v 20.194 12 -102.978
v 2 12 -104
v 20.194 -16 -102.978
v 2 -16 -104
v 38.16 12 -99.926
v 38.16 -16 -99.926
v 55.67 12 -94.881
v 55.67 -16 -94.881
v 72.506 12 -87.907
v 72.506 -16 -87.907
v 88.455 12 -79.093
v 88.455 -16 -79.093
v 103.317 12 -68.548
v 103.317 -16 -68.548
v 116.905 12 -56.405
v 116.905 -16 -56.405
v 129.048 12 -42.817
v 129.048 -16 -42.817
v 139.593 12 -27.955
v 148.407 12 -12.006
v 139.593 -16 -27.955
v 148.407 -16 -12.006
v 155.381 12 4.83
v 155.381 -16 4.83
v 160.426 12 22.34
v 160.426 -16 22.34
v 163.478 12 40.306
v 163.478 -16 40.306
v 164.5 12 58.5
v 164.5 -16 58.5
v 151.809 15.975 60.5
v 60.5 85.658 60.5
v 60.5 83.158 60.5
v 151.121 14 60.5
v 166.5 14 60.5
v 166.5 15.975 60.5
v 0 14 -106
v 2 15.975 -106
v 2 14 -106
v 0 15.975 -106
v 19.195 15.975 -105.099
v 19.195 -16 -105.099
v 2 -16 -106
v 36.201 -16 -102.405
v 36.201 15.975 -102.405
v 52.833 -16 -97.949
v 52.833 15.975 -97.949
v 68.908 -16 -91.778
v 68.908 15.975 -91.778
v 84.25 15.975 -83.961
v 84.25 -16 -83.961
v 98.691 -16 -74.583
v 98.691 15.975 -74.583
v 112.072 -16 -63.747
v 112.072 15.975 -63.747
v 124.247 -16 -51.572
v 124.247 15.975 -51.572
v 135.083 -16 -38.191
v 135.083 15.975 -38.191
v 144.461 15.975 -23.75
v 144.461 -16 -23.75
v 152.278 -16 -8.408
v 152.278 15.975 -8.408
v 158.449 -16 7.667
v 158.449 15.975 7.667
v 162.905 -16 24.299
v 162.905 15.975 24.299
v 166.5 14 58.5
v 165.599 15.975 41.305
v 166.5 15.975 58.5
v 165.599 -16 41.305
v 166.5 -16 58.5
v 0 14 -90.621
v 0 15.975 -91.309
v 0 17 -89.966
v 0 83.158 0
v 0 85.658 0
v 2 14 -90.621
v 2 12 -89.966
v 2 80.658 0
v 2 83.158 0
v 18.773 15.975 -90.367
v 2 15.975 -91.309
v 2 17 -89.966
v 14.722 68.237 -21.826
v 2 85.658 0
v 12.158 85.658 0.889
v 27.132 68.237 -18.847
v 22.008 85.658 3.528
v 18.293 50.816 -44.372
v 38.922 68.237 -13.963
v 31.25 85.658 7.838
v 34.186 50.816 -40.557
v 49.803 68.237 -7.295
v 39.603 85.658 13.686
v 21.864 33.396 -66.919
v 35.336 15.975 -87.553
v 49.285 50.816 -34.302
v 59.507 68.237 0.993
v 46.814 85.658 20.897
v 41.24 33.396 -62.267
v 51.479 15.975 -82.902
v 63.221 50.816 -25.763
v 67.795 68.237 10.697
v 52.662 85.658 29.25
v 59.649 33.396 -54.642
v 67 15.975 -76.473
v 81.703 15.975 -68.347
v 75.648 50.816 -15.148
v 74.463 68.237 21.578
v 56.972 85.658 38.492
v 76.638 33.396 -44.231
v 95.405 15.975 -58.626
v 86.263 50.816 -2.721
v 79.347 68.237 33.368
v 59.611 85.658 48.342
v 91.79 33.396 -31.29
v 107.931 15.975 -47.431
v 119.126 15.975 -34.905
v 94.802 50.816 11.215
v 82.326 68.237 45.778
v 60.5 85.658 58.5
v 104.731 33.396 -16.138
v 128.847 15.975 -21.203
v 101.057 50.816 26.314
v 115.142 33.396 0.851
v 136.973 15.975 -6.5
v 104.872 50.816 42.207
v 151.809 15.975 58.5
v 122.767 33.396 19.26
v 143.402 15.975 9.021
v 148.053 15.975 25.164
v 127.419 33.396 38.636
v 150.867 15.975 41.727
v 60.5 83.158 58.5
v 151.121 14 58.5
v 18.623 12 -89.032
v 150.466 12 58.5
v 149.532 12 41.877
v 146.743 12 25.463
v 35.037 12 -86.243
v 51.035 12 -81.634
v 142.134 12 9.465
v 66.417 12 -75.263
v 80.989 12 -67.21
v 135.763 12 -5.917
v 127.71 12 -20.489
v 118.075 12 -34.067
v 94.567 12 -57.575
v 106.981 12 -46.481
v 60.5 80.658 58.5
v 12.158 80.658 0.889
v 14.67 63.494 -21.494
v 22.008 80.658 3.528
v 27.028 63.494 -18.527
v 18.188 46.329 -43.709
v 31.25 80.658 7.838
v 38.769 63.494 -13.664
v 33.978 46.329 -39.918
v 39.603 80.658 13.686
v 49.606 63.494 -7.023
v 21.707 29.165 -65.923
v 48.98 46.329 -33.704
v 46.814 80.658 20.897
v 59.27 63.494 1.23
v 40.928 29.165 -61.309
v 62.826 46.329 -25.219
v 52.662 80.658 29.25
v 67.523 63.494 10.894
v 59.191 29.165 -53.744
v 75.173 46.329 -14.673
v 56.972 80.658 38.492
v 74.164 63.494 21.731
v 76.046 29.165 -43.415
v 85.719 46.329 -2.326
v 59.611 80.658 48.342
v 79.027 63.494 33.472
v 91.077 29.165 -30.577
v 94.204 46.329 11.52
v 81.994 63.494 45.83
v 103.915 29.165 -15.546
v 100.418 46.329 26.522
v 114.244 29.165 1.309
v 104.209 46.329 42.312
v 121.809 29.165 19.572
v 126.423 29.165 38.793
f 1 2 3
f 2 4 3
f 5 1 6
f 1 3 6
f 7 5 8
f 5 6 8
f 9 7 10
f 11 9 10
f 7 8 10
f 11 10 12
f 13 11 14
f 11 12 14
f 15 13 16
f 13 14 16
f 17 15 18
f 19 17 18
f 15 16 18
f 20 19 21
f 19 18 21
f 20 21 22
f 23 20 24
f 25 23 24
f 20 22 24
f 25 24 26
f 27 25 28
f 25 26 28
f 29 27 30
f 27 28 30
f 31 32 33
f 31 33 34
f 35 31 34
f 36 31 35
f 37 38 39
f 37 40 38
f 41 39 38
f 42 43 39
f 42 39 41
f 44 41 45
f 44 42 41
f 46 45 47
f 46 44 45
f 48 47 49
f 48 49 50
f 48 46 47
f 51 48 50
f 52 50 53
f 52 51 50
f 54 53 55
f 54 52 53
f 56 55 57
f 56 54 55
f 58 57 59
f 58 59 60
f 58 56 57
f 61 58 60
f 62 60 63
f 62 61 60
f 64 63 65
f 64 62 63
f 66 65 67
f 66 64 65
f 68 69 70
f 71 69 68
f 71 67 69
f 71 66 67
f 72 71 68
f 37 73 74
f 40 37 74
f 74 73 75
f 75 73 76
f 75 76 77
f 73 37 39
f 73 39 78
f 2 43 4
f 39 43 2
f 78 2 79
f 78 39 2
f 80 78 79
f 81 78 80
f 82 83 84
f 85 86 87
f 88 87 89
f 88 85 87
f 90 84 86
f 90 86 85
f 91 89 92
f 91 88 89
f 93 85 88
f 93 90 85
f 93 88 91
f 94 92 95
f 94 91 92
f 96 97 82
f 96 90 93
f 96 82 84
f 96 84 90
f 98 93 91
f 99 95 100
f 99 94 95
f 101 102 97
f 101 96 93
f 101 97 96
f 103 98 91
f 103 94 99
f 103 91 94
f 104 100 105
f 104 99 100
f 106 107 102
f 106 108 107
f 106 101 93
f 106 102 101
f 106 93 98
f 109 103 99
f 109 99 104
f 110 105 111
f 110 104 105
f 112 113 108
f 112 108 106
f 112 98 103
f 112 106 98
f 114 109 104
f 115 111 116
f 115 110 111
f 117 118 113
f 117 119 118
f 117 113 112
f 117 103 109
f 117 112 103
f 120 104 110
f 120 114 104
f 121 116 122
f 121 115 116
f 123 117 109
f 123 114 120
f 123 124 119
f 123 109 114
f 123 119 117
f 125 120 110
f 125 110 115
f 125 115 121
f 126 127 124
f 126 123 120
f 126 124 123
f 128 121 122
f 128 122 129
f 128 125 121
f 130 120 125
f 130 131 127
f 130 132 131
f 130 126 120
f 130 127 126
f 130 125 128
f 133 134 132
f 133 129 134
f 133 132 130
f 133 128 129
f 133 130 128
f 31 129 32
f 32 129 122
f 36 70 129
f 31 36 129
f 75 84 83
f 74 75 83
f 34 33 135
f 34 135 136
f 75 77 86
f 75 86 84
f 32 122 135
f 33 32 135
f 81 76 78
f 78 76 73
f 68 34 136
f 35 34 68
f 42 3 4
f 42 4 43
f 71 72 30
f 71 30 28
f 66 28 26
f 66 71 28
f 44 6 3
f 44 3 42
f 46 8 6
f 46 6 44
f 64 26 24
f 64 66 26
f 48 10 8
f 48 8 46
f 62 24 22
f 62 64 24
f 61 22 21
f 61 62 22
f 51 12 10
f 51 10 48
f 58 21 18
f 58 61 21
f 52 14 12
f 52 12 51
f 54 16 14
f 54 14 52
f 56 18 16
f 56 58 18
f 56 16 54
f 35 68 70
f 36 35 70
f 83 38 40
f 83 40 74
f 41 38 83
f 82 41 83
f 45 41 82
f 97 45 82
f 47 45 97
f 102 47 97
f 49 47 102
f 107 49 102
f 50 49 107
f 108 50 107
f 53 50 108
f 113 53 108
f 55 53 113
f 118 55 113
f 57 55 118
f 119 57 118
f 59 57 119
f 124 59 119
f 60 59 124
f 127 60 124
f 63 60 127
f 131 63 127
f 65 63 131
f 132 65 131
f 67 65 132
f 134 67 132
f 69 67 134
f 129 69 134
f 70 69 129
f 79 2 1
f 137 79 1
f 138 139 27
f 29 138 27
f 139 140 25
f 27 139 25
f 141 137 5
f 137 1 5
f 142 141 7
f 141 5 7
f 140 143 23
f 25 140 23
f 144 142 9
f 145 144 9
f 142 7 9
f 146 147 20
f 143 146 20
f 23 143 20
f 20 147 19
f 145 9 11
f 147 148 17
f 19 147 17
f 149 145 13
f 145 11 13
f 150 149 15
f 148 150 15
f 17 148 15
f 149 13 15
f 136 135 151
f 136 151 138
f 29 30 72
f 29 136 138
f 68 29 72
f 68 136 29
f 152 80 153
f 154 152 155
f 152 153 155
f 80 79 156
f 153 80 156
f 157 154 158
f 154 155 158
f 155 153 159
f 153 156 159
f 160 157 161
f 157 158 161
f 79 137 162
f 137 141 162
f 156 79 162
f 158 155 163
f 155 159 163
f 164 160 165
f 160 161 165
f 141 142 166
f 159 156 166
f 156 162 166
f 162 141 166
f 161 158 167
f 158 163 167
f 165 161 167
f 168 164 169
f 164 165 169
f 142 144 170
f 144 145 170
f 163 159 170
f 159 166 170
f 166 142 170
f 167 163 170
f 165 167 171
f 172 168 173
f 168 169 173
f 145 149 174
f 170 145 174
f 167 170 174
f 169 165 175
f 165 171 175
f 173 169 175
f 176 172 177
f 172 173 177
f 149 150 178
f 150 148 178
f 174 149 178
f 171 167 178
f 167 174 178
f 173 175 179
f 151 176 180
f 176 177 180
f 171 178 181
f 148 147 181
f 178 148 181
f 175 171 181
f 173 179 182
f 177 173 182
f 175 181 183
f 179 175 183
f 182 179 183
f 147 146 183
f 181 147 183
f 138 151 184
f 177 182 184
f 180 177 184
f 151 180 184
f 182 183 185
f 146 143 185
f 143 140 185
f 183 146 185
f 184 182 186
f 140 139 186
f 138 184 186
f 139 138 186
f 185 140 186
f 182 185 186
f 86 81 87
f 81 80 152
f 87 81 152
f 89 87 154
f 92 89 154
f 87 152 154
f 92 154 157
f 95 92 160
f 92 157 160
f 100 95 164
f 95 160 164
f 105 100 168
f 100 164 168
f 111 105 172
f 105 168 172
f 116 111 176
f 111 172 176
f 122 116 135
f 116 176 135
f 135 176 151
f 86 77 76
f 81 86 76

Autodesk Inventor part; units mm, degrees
ref_plane "YZ Plane" through (0, 0, 0) normal (1, 0, 0) x (0, 1, 0)
ref_plane "XZ Plane" through (0, 0, 0) normal (0, 1, 0) x (-1, 0, 0)
ref_plane "XY Plane" through (0, 0, 0) normal (0, 0, 1) x (1, 0, 0)
sketch "Sketch1" plane through (0, 0, 0) normal (1, 0, 0) x (0, 1, 0)
  line L0 (0, 0) -> (0, -104)
  line L1 (79.3684, 0) -> (0, -104)
  line L2 (79.3684, 0) -> (0, 0)
  line L3 (0, -104) -> (0, -104)
  line L4 (0, -104) -> (0, -106)
  line L5 (0, -106) -> (0, -106)
  line L6 (12, -88.2759) -> (12, -121.4374)
  line L7 (17, -106) -> (0, -106)
  line L8 (17, -104) -> (0, -104)
  line L9 (85.6581, 0) -> (17, -89.9658)
  line L10 (105.5294, 0) -> (79.3684, 0)
  line L11 (17, -89.9658) -> (17, -119.3457)
  circle A0 centre (12, -106) radius 2
  point P0 (12, -104)
  point P1 (14, -106)
  dimension "d5" = 79.3684
  dimension "d6" = 104
  dimension "d7" = 12
  dimension "d8" = 88.2759
  dimension "d9" = 0
  dimension "d11" = 2
  dimension "d12" = 5
  dimension "d13" = 5
extrude "Extrusion1" add sketch "Sketch1" along normal blind 2 contours L10 L9 L11 L8 L6 L1 | L8 L11 L7 A0
sketch "Sketch2" plane through (2, 0, 0) normal (1, 0, 0) x (0, 0, -1)
  line L0 (0, 85.6581) -> (0, 79.3684) projected
  line L1 (0, 80.6581) -> (89.9658, 12)
  line L2 (88.2759, 12) -> (104, 12) projected
  line L3 (0, 79.3684) -> (88.2759, 12) projected
  line L4 (102.4983, 12) -> (102.4983, 15.9748)
  line L5 (89.9658, 17) -> (0, 85.6581) projected
  line L6 (106, 14) -> (106, 17) projected
  line L7 (106, 15.9748) -> (91.3092, 15.9748)
  line L8 (0, 85.6581) -> (91.3092, 15.9748)
  line L9 (106, 15.9748) -> (106, 17)
  line L10 (106, 17) -> (89.9658, 17) projected
  line L11 (106, 15.9748) -> (106, 17)
  line L12 (106, 17) -> (89.9658, 17)
  point P0 (0, 0)
  dimension "d18" = 5
  dimension "d19" = 3.9748
  dimension "d20" = 3.9748
extrude "Extrusion2" cut sketch "Sketch2" against normal blind 2 contours L1 L2 L3 L0 | L10 L6 L7 L8
sketch "Sketch3" plane through (2, 0, 0) normal (1, 0, 0) x (0, 0, -1)
  line L0 (91.3092, 15.9748) -> (0, 85.6581) projected
  line L1 (0, 85.6581) -> (91.3092, 15.9748)
  line L2 (91.3092, 15.9748) -> (106, 15.9748) projected
  line L3 (91.3092, 15.9748) -> (106, 15.9748)
  arc A0 (106, 14) -> (104, 12) centre (106, 12) ccw projected
  line L4 (106, 15.9748) -> (106, 14)
  circle A1 centre (106, 12) radius 2
  line L5 (89.9658, 12) -> (104, 12) projected
  line L6 (89.9658, 12) -> (104, 12)
  line L7 (0, 85.6581) -> (0, 80.6581) projected
  line L8 (0, 85.6581) -> (0, 80.6581)
  line L9 (0, 80.6581) -> (89.9658, 12)
  line L10 (0, 83.1581) -> (-58.5, 83.1581)
  line L11 (0, 85.6581) -> (0, 80.6581) projected
  line L12 (-58.5, 83.1581) -> (-58.5, 115.0333)
  line L13 (106, 14) -> (104, 14)
  line L14 (104, 14) -> (104, -16)
  line L15 (104, -16) -> (106, -16)
  line L16 (106, -16) -> (106, 14)
  line L17 (89.9658, 12) -> (89.9658, 145)
  line L18 (0, 83.1581) -> (89.9658, 83.1581)
  point P0 (0, 0)
  dimension "d21" = 58.5
  dimension "d32" = 30
  dimension "d42" = 89.9658
revolve "Revolution1" add sketch "Sketch3" angle 90 about axis through (2, 83.1581, 58.5) along (0, -1, 0) contours L2 L4 L13 L14 L5 L17 L0 | L17 L9 L7 L18 L0 | L18 L7 L0 | L16 A1 A0 | A0 L14 L13 | A1 L16 L15 L14
sketch "Sketch14" plane through (166.5, -16, 58.5) normal (0, 0, 1) x (1, 0, 0)
  line L0 (-14.6908, 31.9748) -> (-106, 101.6581) projected
  line L1 (-106, 96.6581) -> (-16.0342, 28) projected
  line L2 (-106, 101.6581) -> (-106, 96.6581)
  line L3 (-16.0342, 28) -> (-2, 28) projected
  line L4 (-106, 96.6581) -> (-16.0342, 28)
  point P0 (-166.5, 16)
sketch "Sketch4" plane through (60.5, 80.6581, 58.5) normal (0, 0, 1) x (1, 0, 0)
  line L0 (0, 5) -> (0, 0) projected
  line L1 (0, 5) -> (0, 0)
  line L2 (0, 0) -> (89.9658, -68.6581) projected
  line L3 (0, 0) -> (89.9658, -68.6581)
  line L4 (89.9658, -68.6581) -> (104, -68.6581) projected
  line L5 (89.9658, -68.6581) -> (104, -68.6581)
  line L6 (106, -66.6581) -> (106, -64.6834) projected
  line L7 (106, -66.6581) -> (106, -64.6834)
  line L8 (91.3092, -64.6834) -> (0, 5) projected
  line L9 (106, -64.6834) -> (91.3092, -64.6834)
  line L10 (91.3092, -64.6834) -> (0, 5)
  arc A0 (106, -66.6581) -> (104, -68.6581) centre (106, -68.6581) ccw projected
  circle A1 centre (106, -68.6581) radius 2
  point P0 (-60.5, -80.6581)
extrude "Extrusion3" add sketch "Sketch4" along normal blind 2 contours L8 L9 L6 A0 L4 L2 L0
sketch "Sketch5" plane through (60.5, 80.6581, 60.5) normal (0, 0, 1) x (1, 0, 0)
  line L0 (0, 5) -> (0, 0) projected
  line L1 (0, 2.5) -> (90.621, -66.6581)
  line L2 (-58.5, -66.6581) -> (106, -66.6581) projected
  line L3 (91.3092, -64.6834) -> (0, 5) projected
  line L4 (90.621, -66.6581) -> (106, -66.6581)
  line L5 (106, -66.6581) -> (106, -64.6834) projected
  line L6 (106, -64.6834) -> (91.3092, -64.6834) projected
  line L7 (106, -64.6834) -> (91.3092, -64.6834)
  line L8 (-58.5, 5) -> (0, 5) projected
  line L9 (91.3092, -64.6834) -> (0, 5)
  line L10 (0, 5) -> (0, 2.5)
  line L11 (0, 0) -> (89.9658, -68.6581) projected
  line L12 (89.9658, -68.6581) -> (106, -68.6581)
  line L13 (89.9658, -68.6581) -> (104, -68.6581) projected
  line L14 (106, -68.6581) -> (106, -66.6581)
  line L15 (90.621, -66.6581) -> (0, 2.5)
  line L16 (0, 0) -> (89.9658, -68.6581)
  point P0 (-60.5, -80.6581)
extrude "Extrusion4" cut sketch "Sketch5" against normal blind 2 contours L1 L2 L11 L0 | L2 L14 L12 L11
sketch "Sketch6" plane through (0, 0, 0) normal (-1, 0, 0) x (0, 0, 1)
  line L0 (0, 85.6581) -> (0, 80.6581) projected
  line L1 (0, 83.1581) -> (-90.621, 14)
  line L2 (-106, 14) -> (58.5, 14) projected
  line L3 (-91.3092, 15.9748) -> (0, 85.6581) projected
  line L4 (-106, 14) -> (-106, 15.9748) projected
  line L5 (-90.621, 14) -> (-106, 14)
  line L6 (-106, 14) -> (-106, 15.9748)
  line L7 (-106, 15.9748) -> (-91.3092, 15.9748)
  line L8 (0, 85.6581) -> (0, 83.1581)
  line L9 (-89.9658, 12) -> (58.5, 12) projected
  line L10 (-89.9658, 12) -> (-106, 12)
  line L11 (-104, 12) -> (58.5, 12) projected
  line L12 (-106, 12) -> (-106, 14)
  line L13 (-90.621, 14) -> (0, 83.1581)
  line L14 (0, 80.6581) -> (-89.9658, 12)
  point P0 (0, 0)
extrude "Extrusion5" cut sketch "Sketch6" against normal blind 2 contours L0 L14 L2 L1 | L2 L14 L10 L12
equation "\"d19\" = d20"
properties part number "Cover_v1"
